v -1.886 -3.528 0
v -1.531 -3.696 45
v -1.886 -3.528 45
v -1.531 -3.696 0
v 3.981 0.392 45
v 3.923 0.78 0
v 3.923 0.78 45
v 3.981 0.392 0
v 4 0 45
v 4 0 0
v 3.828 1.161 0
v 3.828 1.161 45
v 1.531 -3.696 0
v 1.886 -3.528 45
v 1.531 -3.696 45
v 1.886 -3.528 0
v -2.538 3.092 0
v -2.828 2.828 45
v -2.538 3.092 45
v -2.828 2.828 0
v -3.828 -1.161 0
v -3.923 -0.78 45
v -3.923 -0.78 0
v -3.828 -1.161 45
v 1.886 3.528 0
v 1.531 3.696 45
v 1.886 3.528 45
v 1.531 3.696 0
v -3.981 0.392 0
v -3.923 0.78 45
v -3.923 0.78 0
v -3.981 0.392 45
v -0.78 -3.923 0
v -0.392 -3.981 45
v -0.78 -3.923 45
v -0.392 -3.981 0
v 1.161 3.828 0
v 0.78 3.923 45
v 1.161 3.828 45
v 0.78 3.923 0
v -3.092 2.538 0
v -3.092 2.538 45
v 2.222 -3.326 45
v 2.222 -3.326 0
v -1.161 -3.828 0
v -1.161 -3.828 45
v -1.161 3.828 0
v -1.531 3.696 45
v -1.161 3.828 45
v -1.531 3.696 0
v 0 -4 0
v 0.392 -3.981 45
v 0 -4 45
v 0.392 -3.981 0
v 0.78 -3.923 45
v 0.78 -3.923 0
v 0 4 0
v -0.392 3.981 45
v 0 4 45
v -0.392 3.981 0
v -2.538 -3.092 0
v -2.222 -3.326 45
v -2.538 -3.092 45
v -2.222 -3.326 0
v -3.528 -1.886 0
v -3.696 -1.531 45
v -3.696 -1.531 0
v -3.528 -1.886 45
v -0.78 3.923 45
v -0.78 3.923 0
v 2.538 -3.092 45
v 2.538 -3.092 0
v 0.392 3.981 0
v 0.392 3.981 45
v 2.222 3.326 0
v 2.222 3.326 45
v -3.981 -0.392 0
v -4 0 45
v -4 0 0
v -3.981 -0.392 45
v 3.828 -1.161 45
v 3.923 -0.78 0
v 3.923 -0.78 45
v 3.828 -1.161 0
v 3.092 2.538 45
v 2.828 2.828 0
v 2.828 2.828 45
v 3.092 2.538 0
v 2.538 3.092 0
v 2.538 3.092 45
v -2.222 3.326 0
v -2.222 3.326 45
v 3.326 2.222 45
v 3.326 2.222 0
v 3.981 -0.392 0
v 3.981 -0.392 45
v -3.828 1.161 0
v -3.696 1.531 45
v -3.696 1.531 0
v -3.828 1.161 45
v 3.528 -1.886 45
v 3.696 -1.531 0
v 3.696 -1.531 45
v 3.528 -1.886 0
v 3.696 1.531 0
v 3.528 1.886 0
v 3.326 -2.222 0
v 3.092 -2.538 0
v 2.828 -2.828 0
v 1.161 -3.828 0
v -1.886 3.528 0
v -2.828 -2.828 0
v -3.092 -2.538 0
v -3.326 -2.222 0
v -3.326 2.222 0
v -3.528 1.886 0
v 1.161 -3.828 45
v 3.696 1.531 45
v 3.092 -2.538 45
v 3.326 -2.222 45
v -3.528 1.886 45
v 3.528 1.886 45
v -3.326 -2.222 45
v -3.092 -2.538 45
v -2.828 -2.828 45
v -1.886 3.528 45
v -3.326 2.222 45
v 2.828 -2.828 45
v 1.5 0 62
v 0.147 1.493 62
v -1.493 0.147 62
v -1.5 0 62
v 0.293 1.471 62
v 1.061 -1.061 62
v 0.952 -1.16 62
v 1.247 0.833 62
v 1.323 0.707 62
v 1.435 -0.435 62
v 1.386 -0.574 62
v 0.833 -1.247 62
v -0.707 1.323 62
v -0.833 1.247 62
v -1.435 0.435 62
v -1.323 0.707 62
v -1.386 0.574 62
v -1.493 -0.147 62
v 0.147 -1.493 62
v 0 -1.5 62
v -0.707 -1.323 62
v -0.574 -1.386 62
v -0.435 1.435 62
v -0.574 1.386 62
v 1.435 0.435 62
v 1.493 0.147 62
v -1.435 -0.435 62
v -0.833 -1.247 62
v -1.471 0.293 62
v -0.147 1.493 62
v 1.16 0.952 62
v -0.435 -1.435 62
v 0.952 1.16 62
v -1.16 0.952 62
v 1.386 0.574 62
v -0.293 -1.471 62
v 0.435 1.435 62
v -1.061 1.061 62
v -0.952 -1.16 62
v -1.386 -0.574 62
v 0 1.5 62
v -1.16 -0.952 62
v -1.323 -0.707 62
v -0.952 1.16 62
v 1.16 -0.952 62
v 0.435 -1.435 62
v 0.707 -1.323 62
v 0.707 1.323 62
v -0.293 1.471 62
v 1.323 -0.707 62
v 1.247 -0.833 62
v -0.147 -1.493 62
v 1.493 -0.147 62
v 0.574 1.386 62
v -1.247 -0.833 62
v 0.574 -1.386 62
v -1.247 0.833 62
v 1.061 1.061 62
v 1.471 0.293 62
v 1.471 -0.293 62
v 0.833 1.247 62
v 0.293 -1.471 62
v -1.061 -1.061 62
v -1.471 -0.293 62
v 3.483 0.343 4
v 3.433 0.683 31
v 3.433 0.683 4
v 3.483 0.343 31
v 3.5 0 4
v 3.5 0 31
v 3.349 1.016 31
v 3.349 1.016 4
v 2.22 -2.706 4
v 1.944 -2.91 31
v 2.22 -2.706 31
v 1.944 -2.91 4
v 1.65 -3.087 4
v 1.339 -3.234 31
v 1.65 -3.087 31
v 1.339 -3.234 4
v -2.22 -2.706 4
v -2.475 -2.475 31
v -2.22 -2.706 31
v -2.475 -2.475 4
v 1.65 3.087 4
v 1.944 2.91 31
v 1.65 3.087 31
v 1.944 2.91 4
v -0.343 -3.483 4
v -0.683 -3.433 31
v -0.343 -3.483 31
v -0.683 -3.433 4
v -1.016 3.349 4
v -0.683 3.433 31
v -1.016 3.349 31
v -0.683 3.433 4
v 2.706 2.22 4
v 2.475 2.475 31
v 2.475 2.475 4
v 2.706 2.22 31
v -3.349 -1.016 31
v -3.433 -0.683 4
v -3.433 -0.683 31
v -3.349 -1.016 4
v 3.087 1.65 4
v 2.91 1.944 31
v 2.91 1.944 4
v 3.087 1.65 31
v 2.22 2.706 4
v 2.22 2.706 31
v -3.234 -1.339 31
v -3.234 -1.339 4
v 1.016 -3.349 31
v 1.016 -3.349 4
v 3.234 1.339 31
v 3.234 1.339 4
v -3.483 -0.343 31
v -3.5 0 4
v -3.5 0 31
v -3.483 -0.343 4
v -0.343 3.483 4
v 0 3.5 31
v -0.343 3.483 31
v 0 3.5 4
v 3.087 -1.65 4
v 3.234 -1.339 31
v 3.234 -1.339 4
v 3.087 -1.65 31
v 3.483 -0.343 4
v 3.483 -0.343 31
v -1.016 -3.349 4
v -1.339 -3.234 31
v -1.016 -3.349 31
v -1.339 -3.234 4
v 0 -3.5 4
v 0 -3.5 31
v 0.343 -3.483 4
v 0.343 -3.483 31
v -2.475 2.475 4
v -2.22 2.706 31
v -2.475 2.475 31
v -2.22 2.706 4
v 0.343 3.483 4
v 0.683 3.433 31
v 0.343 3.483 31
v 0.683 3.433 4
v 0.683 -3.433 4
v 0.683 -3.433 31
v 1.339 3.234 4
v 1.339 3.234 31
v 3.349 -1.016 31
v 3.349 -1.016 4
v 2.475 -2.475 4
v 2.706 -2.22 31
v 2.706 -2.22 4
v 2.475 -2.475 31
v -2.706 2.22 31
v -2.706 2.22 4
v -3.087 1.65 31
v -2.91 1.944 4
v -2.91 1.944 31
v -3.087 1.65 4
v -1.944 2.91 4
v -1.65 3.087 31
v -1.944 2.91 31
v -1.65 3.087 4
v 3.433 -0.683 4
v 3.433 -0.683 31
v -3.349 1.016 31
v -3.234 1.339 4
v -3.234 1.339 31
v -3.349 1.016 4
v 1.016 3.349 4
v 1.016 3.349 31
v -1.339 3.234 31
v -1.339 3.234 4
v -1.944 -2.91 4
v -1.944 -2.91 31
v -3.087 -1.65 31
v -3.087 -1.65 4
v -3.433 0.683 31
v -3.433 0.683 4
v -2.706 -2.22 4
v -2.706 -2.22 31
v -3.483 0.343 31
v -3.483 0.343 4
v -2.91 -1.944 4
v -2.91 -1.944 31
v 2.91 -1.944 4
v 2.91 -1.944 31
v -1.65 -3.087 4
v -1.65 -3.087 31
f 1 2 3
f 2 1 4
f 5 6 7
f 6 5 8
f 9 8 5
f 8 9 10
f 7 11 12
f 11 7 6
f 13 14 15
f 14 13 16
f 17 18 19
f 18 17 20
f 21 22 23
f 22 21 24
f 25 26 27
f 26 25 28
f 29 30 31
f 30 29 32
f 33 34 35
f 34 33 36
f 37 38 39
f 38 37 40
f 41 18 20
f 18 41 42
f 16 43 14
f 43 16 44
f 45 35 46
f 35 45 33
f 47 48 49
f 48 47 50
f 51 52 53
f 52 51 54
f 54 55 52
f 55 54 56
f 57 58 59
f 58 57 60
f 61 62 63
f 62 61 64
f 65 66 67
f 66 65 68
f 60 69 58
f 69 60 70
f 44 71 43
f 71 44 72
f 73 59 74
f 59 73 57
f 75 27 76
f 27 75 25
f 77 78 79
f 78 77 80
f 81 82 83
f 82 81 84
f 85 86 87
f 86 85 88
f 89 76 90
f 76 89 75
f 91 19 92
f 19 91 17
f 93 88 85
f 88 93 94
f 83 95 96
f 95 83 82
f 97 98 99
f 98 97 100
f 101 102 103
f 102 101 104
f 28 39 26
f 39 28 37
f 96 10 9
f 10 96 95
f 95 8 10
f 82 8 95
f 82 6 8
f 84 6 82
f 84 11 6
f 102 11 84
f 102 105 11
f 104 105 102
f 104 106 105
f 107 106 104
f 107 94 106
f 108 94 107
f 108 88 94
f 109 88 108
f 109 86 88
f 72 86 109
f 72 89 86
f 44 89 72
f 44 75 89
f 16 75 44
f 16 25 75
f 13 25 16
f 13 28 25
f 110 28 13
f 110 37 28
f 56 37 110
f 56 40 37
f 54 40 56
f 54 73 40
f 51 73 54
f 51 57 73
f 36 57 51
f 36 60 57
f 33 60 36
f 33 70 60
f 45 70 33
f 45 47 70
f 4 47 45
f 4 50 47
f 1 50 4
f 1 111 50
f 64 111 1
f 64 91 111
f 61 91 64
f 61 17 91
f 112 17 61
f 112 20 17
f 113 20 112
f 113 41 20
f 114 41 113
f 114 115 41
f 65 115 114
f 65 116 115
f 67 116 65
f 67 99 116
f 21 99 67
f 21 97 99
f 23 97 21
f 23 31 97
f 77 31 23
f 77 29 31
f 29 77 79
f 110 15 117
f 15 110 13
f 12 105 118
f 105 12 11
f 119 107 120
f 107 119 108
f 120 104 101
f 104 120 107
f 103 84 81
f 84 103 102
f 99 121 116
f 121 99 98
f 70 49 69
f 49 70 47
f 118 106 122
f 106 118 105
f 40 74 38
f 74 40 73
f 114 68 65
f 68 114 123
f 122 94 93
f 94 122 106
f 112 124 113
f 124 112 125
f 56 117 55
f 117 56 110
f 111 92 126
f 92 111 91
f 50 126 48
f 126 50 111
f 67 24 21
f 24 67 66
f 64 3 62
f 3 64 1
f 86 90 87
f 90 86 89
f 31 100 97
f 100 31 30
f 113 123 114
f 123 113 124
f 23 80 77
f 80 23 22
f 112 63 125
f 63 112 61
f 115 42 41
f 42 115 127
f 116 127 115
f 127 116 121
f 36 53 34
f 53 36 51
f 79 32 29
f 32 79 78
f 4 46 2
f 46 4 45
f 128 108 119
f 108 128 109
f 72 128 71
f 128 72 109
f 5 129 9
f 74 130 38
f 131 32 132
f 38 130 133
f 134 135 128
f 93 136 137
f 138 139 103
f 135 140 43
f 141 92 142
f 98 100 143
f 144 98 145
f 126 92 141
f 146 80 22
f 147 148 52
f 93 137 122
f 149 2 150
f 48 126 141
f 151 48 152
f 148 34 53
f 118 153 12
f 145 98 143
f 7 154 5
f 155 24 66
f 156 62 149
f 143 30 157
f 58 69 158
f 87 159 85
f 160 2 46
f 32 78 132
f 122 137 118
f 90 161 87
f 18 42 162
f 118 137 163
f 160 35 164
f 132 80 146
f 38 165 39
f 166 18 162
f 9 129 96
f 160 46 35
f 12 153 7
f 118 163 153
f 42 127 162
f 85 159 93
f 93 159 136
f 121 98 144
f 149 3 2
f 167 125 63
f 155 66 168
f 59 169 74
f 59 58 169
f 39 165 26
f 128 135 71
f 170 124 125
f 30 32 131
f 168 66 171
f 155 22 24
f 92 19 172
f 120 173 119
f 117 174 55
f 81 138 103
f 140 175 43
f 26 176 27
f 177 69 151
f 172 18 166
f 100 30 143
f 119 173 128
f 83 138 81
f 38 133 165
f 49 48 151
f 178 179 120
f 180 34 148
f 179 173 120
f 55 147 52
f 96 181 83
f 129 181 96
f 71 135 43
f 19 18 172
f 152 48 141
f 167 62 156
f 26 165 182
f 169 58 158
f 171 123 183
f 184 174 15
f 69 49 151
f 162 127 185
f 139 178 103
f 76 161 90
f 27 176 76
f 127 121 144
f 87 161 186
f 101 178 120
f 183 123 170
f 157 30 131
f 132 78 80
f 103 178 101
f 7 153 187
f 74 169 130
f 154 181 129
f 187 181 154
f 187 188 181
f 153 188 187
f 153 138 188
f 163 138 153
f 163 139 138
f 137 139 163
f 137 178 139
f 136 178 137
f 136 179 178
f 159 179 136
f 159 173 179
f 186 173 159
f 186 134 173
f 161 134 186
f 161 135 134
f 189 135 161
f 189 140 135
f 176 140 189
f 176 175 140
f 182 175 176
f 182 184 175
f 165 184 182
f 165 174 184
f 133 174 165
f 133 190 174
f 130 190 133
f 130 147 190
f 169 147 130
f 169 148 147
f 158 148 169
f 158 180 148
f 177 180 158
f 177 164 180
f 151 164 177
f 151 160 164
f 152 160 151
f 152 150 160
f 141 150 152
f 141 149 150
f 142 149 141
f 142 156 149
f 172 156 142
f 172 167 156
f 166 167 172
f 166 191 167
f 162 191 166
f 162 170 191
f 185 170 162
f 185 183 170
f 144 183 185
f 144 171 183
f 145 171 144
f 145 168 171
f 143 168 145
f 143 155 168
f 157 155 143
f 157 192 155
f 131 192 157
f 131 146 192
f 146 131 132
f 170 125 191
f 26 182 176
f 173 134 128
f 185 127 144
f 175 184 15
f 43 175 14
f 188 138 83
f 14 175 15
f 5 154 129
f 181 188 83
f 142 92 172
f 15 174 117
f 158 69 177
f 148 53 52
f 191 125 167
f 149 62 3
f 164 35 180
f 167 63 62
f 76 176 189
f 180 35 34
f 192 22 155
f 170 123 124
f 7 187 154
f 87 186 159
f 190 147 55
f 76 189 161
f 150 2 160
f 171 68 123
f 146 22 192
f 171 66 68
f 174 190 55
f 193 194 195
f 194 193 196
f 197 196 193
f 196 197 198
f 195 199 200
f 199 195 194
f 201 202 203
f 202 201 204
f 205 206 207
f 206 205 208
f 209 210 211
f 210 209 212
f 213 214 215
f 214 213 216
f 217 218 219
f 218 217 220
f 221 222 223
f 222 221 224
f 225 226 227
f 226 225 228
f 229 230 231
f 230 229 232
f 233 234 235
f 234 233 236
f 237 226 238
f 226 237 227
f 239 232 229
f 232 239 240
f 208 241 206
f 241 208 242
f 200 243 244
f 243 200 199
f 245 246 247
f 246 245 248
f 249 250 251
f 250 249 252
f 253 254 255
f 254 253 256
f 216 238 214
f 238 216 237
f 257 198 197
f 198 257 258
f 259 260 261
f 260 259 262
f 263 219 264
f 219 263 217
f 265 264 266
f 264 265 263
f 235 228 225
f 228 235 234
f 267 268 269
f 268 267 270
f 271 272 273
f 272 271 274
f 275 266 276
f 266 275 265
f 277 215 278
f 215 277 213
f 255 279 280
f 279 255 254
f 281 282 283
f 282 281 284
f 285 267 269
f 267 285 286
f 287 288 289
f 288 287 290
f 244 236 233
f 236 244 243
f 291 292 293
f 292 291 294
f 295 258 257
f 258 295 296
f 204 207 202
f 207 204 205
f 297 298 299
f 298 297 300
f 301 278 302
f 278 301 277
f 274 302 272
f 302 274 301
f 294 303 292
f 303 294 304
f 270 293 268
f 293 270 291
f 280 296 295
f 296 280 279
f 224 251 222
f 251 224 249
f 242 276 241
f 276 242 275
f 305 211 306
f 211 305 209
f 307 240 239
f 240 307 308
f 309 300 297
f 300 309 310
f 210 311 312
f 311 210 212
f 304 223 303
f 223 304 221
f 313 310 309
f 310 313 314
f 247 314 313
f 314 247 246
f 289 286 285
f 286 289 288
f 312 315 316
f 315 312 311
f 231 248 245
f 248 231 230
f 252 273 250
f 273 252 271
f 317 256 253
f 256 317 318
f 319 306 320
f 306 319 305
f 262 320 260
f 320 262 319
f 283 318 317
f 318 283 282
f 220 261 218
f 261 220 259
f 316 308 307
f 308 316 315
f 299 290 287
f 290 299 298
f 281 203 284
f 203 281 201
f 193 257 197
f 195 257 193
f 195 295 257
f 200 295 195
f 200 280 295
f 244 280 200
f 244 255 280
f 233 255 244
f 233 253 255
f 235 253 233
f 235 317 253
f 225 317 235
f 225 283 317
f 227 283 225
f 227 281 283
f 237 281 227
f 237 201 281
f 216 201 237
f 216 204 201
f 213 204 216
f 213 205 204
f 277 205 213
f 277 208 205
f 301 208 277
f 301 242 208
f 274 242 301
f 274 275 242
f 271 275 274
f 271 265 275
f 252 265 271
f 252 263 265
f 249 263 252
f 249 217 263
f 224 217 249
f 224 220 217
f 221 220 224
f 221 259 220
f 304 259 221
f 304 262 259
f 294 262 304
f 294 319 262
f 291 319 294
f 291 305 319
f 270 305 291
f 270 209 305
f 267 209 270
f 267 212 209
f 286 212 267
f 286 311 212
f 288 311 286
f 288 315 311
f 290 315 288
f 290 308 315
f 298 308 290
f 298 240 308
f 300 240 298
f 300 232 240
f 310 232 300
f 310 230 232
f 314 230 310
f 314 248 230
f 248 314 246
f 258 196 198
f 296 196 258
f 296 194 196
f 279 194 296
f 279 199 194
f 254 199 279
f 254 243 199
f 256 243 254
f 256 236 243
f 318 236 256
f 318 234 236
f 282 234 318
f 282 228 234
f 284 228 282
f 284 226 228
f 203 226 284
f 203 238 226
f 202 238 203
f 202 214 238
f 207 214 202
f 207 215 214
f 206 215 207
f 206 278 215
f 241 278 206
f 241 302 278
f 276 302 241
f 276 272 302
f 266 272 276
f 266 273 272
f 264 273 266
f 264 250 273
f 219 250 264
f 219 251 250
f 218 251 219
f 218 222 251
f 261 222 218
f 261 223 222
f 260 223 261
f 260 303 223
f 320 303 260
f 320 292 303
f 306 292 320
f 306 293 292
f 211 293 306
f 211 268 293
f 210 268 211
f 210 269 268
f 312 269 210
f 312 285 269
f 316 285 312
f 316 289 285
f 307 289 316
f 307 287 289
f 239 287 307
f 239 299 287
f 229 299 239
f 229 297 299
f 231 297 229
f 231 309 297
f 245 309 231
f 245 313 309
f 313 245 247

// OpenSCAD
// Pestle for 1.5 mL microcentrifuge tube - printed standing upright.
// Dimensions in mm.

// Handle
h_d      = 8;      // Handle diameter
h_start  = 0;      // Handle start Z
h_end    = 45;     // Handle end Z

// Cone
c_d_top  = 8;      // Cone top diameter (at z=45)
c_d_bot  = 3;      // Cone bottom diameter (at z=62)
c_start  = 45;     // Cone start Z
c_end    = 62;     // Cone end Z

// Tip
tip_d    = 3;      // Tip diameter
tip_c    = 62;     // Tip center Z

// Grooves
g_count  = 4;      // Number of grooves
g_z      = [10, 15, 20, 25]; // Z positions of groove centers
g_w      = 2;      // Groove width (Z)
g_d      = 1;      // Groove depth

$fn = 64;

// Main body: Handle + Cone + Tip
difference() {
    union() {
        // 1. Cylindrical Handle
        translate([0, 0, h_start])
            cylinder(h = h_end - h_start, d = h_d);

        // 2. Cone (tapering from 8mm to 3mm)
        translate([0, 0, c_start])
            cylinder(h = c_end - c_start, d1 = c_d_top, d2 = c_d_bot);

        // 3. Rounded Tip (Sphere centered at z=62)
        translate([0, 0, tip_c - tip_d / 2])
            sphere(r = tip_d / 2);
    }

    // 4. Grooves (cut into the handle)
    // We cut a cylinder through the handle at each Z position.
    // The cylinder must extend significantly past the handle top/bottom to ensure clean cuts.
    for (i = [0 : g_count - 1]) {
        z_pos = g_z[i];
        // Position the cutting cylinder so its center is exactly at z_pos.
        // The cylinder extends from z_pos - g_w/2 to z_pos + g_w/2.
        // We extend it further past the handle boundaries (0 and 45) to ensure full intersection.
        translate([0, 0, z_pos - g_w / 2 - 5])
            cylinder(h = g_w + 10, d = h_d - g_d);
    }
}
